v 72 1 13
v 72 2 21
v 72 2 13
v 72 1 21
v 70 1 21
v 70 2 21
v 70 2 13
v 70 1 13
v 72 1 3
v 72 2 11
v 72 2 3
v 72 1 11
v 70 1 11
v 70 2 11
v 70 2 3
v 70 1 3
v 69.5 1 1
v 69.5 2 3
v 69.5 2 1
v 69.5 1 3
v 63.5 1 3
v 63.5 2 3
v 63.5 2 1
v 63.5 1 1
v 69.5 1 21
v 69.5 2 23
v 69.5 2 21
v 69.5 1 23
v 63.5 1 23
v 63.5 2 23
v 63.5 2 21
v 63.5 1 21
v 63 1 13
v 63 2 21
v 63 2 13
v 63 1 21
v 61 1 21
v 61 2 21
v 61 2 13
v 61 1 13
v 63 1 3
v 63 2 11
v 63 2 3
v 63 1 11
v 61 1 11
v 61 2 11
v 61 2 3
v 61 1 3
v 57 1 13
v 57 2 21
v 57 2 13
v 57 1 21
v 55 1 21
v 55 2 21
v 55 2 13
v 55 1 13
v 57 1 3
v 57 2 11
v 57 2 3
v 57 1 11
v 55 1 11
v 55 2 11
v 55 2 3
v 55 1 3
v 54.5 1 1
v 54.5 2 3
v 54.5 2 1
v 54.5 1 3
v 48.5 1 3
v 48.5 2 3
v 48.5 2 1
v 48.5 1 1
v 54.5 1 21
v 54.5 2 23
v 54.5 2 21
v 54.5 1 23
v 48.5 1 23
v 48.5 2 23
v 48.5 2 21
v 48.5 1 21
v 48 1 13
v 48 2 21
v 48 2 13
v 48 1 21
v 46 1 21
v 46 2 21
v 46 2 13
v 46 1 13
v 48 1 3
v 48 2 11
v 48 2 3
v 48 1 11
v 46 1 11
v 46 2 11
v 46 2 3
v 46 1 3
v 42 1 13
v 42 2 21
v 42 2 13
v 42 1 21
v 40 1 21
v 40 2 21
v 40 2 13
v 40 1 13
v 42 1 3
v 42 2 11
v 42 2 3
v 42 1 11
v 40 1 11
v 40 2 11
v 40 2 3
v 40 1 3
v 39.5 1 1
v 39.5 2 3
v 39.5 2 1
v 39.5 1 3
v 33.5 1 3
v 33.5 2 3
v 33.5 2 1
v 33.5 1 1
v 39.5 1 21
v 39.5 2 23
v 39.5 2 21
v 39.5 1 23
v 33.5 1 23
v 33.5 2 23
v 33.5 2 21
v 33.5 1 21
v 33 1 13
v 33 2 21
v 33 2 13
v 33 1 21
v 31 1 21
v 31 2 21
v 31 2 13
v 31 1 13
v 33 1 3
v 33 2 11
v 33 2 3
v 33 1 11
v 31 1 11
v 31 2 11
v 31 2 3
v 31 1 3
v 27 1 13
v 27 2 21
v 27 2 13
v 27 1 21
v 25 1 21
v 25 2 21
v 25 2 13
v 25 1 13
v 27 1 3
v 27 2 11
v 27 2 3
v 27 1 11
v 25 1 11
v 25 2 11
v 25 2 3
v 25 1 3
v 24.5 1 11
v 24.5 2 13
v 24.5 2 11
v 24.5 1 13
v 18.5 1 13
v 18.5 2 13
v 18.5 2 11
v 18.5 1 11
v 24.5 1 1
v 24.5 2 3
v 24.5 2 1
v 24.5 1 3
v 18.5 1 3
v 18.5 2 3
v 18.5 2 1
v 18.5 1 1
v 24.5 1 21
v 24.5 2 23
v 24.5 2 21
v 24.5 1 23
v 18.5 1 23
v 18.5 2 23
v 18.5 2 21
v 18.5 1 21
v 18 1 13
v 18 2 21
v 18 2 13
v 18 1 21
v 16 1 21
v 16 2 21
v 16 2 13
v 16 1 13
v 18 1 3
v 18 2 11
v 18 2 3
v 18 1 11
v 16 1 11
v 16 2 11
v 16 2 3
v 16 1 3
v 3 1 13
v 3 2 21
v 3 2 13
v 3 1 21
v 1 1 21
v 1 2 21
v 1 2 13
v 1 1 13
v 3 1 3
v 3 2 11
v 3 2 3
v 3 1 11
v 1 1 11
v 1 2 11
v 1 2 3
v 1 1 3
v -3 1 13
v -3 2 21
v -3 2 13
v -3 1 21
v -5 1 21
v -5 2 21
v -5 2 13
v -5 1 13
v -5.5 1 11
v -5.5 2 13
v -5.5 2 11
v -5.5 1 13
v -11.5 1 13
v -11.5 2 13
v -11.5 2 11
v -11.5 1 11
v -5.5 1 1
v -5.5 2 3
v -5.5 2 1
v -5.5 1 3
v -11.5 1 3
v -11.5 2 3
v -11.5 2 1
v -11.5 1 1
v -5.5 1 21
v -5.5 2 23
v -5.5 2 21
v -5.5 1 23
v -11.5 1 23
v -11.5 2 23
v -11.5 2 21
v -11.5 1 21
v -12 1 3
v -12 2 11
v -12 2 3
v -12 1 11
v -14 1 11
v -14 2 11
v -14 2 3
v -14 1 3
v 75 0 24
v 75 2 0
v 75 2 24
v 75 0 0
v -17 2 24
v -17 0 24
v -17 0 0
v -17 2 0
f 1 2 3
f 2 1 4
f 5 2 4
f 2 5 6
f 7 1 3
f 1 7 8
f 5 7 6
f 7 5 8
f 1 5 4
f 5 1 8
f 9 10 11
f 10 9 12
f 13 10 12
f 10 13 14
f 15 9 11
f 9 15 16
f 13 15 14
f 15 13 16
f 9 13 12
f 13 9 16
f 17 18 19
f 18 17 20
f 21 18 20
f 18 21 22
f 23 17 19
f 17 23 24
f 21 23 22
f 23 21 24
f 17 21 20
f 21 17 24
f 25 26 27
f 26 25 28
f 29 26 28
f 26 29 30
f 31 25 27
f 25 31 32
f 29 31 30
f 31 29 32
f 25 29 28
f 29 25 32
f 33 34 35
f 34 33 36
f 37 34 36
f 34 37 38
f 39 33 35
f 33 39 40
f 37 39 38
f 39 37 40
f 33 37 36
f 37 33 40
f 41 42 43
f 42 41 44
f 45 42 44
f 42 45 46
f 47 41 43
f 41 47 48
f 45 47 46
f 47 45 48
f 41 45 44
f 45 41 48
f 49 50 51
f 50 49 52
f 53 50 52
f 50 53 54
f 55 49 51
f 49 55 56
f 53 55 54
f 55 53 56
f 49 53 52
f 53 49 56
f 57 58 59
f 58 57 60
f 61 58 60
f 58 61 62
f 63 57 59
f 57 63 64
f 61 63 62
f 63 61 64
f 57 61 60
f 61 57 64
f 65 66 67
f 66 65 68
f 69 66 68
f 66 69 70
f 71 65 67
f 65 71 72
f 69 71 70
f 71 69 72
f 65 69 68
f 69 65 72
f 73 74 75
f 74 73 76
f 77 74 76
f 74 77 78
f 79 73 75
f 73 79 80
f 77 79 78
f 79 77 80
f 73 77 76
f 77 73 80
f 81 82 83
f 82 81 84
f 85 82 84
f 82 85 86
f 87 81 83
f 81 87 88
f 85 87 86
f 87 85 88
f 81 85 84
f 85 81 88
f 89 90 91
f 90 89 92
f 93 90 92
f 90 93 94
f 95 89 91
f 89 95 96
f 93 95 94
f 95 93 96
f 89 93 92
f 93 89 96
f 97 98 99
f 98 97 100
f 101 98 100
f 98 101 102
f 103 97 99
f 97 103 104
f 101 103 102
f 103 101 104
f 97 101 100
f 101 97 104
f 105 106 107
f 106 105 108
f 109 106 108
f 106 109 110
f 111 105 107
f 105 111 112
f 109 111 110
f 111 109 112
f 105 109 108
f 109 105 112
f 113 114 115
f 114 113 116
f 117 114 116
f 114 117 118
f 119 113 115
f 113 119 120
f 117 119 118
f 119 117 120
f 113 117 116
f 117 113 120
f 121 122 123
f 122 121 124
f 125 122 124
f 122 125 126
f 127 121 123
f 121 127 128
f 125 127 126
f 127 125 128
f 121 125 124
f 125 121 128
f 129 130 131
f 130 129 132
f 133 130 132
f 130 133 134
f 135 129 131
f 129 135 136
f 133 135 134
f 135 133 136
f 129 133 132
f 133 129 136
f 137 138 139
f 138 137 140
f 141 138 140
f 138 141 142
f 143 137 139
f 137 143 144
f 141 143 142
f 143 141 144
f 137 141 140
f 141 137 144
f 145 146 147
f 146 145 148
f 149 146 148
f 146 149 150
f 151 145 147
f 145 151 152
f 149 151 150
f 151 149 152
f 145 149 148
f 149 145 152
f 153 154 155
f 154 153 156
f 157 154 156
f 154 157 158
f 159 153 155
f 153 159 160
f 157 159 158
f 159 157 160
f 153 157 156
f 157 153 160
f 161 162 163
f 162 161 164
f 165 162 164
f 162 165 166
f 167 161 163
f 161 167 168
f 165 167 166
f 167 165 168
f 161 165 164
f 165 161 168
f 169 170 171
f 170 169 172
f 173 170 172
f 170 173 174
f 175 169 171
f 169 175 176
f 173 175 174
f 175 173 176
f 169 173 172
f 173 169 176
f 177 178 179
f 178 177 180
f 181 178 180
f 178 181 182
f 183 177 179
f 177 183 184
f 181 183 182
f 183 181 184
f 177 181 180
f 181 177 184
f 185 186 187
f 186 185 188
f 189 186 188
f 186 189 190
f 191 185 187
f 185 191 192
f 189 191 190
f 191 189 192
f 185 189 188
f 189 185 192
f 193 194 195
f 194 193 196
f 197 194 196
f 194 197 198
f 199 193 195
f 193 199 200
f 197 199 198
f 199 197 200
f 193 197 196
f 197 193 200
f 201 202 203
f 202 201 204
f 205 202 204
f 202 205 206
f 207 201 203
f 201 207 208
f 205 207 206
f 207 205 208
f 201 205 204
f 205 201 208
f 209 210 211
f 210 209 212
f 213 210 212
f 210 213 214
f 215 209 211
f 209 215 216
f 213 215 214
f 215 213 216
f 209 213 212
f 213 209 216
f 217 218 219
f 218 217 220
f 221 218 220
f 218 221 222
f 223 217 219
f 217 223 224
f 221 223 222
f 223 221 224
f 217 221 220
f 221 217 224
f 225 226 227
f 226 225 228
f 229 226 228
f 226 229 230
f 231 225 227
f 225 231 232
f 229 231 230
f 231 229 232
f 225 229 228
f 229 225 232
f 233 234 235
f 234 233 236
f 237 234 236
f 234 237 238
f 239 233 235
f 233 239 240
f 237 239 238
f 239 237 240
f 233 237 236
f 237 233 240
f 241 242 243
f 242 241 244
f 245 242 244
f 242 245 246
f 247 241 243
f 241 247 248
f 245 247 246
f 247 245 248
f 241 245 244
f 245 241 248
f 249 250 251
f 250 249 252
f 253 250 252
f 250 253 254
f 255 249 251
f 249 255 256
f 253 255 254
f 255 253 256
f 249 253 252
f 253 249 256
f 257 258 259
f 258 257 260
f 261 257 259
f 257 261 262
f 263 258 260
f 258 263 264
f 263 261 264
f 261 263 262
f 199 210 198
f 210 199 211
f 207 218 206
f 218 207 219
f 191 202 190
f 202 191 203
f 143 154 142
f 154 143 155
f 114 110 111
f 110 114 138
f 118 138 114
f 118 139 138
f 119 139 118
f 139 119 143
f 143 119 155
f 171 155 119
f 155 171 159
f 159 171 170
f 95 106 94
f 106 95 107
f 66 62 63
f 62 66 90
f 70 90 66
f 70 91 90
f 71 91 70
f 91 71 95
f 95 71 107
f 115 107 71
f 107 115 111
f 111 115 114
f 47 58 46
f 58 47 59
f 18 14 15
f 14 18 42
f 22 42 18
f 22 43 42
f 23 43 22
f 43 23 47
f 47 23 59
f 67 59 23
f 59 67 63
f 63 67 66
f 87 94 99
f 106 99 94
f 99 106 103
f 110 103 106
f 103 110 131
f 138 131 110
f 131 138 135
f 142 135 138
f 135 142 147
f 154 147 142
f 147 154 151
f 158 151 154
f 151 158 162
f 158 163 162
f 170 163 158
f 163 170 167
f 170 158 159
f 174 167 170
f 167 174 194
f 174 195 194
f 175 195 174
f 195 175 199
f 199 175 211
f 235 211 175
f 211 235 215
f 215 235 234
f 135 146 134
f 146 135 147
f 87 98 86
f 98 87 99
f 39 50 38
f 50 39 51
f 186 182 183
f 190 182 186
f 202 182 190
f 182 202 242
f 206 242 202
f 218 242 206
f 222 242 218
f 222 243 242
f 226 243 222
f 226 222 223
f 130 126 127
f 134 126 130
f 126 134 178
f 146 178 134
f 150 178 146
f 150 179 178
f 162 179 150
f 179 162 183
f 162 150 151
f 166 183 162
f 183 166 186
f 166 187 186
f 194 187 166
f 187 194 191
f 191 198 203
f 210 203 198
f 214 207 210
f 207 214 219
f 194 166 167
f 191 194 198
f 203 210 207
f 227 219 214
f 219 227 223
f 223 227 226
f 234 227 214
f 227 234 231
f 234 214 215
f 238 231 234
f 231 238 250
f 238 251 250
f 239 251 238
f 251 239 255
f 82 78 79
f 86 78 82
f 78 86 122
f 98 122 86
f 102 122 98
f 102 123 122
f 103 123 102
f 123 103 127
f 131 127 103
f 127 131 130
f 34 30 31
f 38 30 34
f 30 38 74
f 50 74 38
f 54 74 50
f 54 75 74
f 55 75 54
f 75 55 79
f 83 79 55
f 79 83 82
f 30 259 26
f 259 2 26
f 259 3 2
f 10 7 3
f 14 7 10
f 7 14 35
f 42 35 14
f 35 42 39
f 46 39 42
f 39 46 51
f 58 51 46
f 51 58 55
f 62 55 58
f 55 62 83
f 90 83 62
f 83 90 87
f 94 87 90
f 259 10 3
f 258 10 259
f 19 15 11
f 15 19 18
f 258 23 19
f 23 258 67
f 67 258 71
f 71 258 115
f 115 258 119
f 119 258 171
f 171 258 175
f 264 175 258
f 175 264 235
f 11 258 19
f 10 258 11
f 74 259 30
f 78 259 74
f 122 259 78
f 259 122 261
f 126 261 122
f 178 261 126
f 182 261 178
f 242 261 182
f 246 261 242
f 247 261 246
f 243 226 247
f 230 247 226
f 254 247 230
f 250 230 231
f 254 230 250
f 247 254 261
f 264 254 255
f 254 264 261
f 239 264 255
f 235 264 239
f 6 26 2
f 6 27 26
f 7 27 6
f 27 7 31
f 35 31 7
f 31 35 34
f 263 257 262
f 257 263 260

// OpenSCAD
// type in the number down below. pay attention. its an array.
// this was initally coded by Emil and improved by Mr. Baldauf

//a = ["1","2","3","4","5","6"];
//a = [1,2,3,4,5,6];
 a = [0,0,0,8,1,5];

module nummer1(){
    translate([61,1,13])cube([2,3,8]);
    translate([61,1,3])cube([2,3,8]);
}
module nummer2(){
    translate([70,1,3])cube([2,3,8]);
    translate([63.5,1,11])cube([6,2,2]);
    translate([63.5,1,1])cube([6,2,2]);
    translate([63.5,1,21])cube([6,2,2]);
    translate([61,1,13])cube([2,3,8]);
}
module nummer3(){
    translate([63.5,1,11])cube([6,2,2]);
        translate([63.5,1,1])cube([6,2,2]);
        translate([63.5,1,21])cube([6,2,2]);
        translate([61,1,13])cube([2,3,8]);
        translate([61,1,3])cube([2,3,8]);
}
module nummer4(){
    translate([70,1,13])cube([2,3,8]);
        translate([63.5,1,11])cube([6,2,2]);
        translate([61,1,13])cube([2,3,8]);
        translate([61,1,3])cube([2,3,8]);
}
module nummer5(){
    translate([70,1,13])cube([2,3,8]);
        translate([63.5,1,11])cube([6,2,2]);
        translate([63.5,1,1])cube([6,2,2]);
        translate([63.5,1,21])cube([6,2,2]);
        translate([61,1,3])cube([2,3,8]);
}
module nummer6(){
    translate([70,1,13])cube([2,3,8]);
        translate([70,1,3])cube([2,3,8]);
        translate([63.5,1,11])cube([6,2,2]);
        translate([63.5,1,1])cube([6,2,2]);
        translate([63.5,1,21])cube([6,2,2]);
        translate([61,1,3])cube([2,3,8]);
}
module nummer7(){
    translate([63.5,1,21])cube([6,2,2]);
        translate([61,1,13])cube([2,3,8]);
        translate([61,1,3])cube([2,3,8]);
}
module nummer8(){
    translate([70,1,13])cube([2,3,8]);
        translate([70,1,3])cube([2,3,8]);
        translate([63.5,1,11])cube([6,2,2]);
        translate([63.5,1,1])cube([6,2,2]);
        translate([63.5,1,21])cube([6,2,2]);
        translate([61,1,13])cube([2,3,8]);
        translate([61,1,3])cube([2,3,8]);
}
module nummer9(){
    translate([70,1,13])cube([2,3,8]);
        translate([63.5,1,11])cube([6,2,2]);
        translate([63.5,1,1])cube([6,2,2]);
        translate([63.5,1,21])cube([6,2,2]);
        translate([61,1,13])cube([2,3,8]);
        translate([61,1,3])cube([2,3,8]);
}
module nummer0(){
    translate([70,1,13])cube([2,3,8]);
    translate([70,1,3])cube([2,3,8]);
    translate([63.5,1,1])cube([6,2,2]);
    translate([63.5,1,21])cube([6,2,2]);
    translate([61,1,13])cube([2,3,8]);
    translate([61,1,3])cube([2,3,8]);
}
module Ziffer(c){
    if (a[c] == 0){
        nummer0();
    }
    if (a[c] == 1){
        nummer1();
    }
    if (a[c] == 2){
        nummer2();
    }
     if (a[c] == 3){
        nummer3();
    }
     if (a[c] == 4){
        nummer4();
    }
     if (a[c] == 5){
        nummer5();
    }
     if (a[c] == 6){
        nummer6();
    }
     if (a[c] == 7){
        nummer7();
    }
     if (a[c] == 8){
        nummer8();
    }
     if (a[c] == 9){
        nummer9();
    }
}

difference()
{
    translate([-17,0,0])cube([92,2,24]);
    union(){
        Ziffer(0);
        translate([-15,0,0])Ziffer(1);
        translate([-30,0,0])Ziffer(2);
        translate([-45,0,0])Ziffer(3);
        translate([-60,0,0])Ziffer(4);
        translate([-75,0,0])Ziffer(5);
    }
}
